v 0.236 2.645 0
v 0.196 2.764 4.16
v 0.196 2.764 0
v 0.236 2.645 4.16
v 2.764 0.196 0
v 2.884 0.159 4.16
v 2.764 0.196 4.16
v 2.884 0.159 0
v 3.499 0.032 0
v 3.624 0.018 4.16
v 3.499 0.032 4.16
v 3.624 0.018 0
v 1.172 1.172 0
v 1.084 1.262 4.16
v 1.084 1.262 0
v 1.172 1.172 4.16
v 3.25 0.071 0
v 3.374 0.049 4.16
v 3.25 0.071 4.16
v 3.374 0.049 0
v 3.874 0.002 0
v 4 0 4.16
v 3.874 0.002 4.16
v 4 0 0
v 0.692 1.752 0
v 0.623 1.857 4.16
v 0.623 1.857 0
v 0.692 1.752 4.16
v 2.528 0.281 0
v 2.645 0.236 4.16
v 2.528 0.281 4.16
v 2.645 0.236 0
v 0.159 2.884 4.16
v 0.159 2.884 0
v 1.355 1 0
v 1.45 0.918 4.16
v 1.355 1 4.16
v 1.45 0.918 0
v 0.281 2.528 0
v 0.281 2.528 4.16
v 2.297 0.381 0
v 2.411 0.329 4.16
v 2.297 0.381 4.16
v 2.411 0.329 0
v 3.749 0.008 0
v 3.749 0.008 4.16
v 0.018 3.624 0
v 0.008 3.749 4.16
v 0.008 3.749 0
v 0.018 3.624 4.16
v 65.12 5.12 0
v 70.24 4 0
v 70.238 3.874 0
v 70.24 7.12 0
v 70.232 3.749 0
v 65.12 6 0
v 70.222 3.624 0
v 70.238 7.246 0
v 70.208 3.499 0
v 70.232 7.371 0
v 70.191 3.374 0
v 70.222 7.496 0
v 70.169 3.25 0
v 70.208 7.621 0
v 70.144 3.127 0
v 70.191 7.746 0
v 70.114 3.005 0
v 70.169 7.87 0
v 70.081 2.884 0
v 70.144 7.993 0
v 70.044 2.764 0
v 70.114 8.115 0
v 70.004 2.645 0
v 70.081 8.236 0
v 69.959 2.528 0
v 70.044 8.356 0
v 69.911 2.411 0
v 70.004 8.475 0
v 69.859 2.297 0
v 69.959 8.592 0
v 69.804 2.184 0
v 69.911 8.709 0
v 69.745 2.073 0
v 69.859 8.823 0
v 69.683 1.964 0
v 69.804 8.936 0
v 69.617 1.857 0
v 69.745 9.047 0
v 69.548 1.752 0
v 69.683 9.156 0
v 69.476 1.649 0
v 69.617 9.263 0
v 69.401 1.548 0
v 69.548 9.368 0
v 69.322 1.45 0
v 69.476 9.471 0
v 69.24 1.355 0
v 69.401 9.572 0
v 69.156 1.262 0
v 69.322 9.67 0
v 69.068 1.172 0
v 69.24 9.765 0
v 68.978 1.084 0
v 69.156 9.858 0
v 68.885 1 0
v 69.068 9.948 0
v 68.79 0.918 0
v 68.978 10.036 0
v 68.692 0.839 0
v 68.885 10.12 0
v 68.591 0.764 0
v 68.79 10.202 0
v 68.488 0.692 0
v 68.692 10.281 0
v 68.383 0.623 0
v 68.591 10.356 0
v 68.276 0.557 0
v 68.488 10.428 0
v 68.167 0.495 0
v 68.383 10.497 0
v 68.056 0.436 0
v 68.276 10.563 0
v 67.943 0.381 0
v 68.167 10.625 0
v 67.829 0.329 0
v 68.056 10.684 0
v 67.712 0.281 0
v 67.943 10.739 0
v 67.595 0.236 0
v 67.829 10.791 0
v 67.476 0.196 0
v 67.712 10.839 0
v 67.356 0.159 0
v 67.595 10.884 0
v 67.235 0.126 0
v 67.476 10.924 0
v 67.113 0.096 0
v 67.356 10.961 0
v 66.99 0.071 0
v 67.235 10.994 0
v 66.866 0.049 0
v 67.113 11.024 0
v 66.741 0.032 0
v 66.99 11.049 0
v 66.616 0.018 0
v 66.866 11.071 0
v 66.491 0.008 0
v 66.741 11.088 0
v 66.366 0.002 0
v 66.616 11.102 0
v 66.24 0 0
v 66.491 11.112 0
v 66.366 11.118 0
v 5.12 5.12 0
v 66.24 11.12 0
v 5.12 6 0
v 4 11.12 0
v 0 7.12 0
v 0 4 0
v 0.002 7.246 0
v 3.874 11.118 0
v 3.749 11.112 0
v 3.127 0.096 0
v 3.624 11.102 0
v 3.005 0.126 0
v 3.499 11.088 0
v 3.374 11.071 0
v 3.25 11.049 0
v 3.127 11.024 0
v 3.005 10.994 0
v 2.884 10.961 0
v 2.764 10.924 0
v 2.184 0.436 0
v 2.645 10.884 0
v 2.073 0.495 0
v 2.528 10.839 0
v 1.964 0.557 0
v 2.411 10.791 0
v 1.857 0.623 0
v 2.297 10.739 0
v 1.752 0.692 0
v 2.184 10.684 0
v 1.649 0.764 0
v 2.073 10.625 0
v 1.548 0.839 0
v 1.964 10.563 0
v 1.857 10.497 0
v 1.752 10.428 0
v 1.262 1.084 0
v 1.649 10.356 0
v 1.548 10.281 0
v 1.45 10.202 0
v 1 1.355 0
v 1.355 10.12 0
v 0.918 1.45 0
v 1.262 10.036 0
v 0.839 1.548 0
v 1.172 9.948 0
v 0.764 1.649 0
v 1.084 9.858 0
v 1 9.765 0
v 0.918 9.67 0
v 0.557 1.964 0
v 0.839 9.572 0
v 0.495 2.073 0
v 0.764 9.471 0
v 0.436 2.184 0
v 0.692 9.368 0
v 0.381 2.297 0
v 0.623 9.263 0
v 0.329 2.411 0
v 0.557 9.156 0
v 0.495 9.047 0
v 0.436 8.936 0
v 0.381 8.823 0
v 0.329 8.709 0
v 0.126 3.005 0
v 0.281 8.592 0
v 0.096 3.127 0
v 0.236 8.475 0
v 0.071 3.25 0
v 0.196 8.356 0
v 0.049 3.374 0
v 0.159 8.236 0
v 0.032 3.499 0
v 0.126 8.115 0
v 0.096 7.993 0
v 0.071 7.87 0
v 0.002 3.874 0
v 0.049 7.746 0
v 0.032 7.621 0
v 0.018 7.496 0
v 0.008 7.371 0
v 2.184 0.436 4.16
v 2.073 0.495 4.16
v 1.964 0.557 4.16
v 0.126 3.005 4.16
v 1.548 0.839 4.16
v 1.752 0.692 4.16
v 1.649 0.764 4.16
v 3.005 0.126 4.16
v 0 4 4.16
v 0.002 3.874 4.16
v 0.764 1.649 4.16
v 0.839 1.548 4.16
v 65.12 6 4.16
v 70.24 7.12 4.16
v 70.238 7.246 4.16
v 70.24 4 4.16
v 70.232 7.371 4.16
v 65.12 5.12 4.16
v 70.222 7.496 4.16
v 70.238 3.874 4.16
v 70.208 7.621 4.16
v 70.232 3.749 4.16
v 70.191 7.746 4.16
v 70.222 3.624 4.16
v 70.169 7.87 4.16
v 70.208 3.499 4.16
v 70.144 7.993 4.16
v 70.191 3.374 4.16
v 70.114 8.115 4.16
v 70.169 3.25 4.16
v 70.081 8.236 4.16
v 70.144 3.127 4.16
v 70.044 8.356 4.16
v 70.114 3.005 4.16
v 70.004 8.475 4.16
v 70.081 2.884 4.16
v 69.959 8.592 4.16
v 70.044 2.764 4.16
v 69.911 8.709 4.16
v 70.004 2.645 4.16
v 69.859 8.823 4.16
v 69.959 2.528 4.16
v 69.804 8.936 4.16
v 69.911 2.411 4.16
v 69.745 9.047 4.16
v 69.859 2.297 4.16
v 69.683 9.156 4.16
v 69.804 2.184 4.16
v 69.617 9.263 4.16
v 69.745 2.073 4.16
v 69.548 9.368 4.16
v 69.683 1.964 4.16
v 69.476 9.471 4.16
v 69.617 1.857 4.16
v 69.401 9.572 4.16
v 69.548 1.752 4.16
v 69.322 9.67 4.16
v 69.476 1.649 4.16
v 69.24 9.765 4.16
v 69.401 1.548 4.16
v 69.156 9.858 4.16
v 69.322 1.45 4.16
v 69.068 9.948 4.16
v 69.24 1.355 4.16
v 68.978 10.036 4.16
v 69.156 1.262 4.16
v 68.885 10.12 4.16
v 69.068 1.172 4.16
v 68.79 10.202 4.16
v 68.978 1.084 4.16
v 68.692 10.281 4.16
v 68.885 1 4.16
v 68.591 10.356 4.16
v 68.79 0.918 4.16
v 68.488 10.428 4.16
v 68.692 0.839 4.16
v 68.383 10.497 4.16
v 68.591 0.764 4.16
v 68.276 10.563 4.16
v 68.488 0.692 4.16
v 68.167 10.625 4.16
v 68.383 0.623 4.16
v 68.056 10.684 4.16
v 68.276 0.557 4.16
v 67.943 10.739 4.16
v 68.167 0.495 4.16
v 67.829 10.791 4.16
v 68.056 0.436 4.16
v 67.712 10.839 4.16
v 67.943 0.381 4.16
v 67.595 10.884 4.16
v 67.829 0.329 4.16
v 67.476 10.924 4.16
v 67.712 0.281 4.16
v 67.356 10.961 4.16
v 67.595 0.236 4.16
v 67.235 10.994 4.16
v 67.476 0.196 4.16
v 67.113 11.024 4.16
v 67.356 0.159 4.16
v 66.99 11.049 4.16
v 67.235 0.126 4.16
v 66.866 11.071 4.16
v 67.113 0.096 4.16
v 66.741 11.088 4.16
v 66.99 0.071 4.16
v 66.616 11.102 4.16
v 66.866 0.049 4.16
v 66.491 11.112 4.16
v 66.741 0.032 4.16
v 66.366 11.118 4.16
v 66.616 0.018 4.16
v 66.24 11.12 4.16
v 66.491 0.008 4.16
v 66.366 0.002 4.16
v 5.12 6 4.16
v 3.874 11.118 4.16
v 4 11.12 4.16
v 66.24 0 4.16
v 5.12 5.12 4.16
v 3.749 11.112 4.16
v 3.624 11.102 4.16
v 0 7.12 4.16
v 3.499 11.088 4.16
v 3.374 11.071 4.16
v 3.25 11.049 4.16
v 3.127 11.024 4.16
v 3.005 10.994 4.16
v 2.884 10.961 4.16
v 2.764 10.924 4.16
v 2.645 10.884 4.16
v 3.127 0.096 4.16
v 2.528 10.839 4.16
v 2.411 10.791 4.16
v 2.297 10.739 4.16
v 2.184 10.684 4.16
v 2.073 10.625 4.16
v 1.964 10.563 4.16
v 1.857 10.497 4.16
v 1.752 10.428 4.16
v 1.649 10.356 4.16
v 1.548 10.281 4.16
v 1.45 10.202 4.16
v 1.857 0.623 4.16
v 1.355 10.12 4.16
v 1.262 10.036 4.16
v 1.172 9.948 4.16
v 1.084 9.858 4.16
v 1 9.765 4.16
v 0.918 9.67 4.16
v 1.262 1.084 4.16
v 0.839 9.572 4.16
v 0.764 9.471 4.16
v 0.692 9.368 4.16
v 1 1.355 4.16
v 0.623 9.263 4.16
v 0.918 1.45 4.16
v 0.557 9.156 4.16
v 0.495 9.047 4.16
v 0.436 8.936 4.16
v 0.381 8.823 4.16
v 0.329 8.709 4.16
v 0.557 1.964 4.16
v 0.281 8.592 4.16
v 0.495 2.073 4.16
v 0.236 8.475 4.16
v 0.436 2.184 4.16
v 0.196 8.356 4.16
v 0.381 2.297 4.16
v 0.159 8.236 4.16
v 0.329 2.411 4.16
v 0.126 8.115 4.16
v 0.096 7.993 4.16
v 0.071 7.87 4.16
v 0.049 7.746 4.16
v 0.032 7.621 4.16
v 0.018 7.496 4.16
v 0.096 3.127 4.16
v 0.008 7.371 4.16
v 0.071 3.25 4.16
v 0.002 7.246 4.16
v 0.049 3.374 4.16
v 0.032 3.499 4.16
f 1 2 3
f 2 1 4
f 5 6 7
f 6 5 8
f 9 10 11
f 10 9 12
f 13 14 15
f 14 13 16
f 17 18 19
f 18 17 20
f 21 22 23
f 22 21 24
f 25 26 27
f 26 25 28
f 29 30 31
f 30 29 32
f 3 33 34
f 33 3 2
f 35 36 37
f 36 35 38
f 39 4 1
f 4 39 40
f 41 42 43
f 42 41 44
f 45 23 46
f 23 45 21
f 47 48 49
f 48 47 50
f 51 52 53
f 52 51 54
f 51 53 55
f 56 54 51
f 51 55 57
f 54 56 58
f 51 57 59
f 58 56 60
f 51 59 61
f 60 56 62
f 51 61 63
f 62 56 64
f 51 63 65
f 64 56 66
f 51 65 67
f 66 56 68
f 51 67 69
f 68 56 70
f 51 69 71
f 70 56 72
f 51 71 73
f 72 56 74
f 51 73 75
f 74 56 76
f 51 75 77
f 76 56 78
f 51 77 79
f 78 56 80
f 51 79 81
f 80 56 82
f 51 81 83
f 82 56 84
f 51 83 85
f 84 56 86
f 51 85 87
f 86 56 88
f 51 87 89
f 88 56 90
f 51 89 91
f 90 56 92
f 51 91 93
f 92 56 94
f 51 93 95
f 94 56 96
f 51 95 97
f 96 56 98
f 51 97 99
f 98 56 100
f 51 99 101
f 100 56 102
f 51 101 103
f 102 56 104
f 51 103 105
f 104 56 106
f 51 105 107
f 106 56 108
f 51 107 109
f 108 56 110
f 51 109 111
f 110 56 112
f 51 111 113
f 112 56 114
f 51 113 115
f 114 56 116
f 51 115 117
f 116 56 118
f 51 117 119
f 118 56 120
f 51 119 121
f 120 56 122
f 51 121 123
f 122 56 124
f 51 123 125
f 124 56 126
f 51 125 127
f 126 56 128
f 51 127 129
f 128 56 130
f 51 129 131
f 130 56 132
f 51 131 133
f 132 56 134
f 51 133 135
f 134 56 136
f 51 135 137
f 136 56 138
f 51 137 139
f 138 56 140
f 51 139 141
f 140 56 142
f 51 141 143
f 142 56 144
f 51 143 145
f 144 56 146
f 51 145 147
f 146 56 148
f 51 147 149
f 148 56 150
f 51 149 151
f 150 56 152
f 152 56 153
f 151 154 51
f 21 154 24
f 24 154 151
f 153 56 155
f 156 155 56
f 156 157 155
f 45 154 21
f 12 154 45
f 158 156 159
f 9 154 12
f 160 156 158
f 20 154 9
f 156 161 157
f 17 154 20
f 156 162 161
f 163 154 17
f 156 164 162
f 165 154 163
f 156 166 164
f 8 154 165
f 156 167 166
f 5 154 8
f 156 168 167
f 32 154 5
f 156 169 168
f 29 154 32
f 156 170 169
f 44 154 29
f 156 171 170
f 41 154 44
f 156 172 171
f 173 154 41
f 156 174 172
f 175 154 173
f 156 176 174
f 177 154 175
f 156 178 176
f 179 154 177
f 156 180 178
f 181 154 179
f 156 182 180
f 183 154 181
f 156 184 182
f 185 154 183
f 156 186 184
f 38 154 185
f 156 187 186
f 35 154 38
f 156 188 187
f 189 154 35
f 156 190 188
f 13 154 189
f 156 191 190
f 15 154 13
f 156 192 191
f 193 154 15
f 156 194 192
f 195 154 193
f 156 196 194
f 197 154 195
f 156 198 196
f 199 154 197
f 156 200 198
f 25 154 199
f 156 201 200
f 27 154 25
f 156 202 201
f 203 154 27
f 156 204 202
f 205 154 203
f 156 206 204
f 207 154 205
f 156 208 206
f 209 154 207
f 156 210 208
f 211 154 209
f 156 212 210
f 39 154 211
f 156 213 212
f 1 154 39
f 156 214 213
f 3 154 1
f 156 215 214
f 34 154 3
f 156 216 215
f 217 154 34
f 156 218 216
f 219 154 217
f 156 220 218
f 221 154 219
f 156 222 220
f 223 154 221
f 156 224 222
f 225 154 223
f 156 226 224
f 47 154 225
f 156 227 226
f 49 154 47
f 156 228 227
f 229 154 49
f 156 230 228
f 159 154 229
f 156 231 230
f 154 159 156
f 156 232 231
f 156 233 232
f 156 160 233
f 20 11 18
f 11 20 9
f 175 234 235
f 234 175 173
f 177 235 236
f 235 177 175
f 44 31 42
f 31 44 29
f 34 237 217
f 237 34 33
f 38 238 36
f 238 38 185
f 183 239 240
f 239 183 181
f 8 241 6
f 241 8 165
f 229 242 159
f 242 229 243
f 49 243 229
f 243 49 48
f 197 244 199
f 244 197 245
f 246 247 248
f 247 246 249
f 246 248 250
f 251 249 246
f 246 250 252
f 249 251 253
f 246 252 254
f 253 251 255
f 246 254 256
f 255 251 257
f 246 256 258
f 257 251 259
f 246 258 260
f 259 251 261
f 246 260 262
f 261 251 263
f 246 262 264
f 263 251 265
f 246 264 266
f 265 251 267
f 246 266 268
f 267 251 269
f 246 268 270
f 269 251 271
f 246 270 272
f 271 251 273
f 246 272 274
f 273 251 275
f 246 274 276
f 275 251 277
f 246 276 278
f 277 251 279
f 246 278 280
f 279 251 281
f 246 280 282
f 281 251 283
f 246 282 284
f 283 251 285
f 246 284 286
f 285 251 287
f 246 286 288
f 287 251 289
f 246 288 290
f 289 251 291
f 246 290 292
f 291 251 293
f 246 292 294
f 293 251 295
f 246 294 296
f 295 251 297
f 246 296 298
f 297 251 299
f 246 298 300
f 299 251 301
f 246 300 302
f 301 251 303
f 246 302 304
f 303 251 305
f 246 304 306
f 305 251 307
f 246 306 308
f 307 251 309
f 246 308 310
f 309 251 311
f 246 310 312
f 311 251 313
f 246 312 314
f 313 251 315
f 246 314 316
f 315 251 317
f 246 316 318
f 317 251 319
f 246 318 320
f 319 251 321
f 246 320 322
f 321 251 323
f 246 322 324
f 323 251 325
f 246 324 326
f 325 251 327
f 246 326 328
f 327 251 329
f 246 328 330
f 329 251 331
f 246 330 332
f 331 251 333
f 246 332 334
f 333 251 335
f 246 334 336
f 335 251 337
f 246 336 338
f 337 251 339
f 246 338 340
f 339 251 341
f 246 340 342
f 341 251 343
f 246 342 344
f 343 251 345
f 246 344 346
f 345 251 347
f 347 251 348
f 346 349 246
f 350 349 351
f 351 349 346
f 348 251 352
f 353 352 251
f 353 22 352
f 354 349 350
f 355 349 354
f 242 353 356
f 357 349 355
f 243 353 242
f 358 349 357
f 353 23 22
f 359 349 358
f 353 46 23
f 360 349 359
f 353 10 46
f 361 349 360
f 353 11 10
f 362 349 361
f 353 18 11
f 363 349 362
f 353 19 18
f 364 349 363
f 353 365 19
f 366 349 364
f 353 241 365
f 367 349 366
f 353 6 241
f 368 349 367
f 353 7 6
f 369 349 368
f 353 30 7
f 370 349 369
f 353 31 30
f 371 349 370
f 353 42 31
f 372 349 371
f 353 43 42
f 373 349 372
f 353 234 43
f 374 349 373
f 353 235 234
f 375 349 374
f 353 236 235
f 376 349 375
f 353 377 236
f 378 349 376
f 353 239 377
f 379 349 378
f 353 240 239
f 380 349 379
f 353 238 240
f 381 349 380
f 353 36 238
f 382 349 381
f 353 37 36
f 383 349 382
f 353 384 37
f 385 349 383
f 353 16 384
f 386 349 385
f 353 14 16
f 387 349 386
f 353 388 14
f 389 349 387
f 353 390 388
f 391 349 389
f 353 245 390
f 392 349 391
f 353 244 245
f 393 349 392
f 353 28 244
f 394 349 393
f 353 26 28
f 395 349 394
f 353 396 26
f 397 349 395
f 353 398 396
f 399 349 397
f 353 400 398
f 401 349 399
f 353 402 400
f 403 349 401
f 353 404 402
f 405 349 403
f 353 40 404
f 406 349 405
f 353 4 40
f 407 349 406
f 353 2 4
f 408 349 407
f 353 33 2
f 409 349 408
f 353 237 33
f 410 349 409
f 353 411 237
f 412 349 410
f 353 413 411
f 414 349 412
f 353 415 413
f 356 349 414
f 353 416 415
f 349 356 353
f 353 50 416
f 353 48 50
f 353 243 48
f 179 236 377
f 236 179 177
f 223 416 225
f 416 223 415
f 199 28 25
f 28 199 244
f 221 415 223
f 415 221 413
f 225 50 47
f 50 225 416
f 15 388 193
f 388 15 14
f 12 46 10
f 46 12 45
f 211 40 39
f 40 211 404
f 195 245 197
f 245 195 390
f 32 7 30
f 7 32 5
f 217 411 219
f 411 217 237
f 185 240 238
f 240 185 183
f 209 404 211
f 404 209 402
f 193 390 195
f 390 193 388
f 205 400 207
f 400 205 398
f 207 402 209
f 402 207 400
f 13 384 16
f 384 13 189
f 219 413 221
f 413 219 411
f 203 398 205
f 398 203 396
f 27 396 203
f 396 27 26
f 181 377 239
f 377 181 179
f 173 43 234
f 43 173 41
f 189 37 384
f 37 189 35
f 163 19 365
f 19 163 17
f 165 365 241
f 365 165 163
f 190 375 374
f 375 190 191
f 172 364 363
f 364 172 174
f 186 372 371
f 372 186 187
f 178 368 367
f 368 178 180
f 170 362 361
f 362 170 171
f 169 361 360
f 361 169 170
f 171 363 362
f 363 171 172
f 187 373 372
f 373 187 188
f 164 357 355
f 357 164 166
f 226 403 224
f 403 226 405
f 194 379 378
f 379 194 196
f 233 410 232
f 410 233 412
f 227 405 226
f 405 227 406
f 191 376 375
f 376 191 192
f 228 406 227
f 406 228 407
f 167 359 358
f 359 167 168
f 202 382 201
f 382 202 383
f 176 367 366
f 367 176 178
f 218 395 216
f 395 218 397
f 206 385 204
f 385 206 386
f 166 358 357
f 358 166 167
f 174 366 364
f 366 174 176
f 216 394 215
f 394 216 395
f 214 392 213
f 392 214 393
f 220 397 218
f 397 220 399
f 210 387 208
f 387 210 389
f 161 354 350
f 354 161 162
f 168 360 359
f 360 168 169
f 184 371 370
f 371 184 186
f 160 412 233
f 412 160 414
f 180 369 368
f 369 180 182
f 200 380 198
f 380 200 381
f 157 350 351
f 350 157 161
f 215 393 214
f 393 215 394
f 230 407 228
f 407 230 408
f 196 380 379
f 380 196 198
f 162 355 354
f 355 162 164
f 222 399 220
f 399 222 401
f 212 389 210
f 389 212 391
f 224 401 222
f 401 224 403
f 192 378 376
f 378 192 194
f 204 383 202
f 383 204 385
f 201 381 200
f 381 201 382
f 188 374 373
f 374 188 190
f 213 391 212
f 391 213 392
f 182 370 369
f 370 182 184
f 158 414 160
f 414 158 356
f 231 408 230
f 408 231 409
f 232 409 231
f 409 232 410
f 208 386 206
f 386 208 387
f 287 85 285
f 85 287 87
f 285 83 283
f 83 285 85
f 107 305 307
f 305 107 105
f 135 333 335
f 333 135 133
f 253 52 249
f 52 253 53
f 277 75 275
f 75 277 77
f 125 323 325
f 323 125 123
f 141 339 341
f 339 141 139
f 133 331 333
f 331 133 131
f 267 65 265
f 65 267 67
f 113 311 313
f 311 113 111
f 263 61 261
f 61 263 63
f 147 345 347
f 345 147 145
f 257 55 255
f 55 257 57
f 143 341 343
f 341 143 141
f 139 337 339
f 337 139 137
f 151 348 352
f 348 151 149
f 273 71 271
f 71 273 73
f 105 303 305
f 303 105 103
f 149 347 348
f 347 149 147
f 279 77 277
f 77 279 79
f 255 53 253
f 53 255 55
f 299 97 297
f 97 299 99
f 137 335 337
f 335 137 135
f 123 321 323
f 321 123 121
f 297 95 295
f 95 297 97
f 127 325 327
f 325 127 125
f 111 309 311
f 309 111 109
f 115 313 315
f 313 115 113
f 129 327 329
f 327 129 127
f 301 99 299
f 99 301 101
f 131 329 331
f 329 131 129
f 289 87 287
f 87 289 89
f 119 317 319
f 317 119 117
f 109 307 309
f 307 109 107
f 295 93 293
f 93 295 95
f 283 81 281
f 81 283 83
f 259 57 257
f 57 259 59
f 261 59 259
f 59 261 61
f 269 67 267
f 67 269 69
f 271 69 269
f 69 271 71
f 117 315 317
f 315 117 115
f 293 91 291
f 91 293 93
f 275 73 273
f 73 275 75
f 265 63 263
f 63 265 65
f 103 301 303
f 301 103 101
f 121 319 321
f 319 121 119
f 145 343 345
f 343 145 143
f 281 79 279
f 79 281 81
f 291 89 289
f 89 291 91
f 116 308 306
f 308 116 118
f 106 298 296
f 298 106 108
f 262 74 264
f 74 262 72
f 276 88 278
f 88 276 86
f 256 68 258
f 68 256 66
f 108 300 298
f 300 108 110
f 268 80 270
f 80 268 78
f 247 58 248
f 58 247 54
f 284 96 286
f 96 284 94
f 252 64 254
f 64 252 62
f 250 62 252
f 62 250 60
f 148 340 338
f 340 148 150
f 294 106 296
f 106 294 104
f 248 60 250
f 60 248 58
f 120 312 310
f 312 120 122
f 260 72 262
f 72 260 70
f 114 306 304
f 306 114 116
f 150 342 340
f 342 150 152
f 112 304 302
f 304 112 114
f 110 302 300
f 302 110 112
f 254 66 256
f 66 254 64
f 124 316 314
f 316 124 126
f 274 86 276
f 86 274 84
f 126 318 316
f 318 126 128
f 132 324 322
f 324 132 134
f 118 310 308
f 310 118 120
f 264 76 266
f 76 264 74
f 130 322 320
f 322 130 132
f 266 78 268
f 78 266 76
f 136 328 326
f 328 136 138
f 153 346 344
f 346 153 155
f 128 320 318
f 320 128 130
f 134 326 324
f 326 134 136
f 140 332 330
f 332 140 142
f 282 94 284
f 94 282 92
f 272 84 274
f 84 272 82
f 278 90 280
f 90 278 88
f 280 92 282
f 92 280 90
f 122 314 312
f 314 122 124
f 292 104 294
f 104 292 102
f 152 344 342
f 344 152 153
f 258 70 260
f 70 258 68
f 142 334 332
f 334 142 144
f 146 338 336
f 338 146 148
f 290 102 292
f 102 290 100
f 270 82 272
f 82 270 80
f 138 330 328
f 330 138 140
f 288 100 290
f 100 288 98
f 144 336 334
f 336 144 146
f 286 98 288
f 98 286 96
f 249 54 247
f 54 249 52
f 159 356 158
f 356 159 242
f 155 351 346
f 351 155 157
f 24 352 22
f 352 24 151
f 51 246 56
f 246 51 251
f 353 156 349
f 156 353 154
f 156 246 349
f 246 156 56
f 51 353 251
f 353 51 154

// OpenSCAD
// file: ../sc.scad
// ShortCuts.scad 
// Autor: Rudolf Huttary, Berlin 2015
//
$fn = 100; 

//show_examples(); 

module show_examples()
	place_in_rect(30, 30)
	{
		Cy(h = 10); 
		CyH(h = 10); 
		CyH(h = 10, w = 30); 
		CyS(h = 10); 
		CyS(h = 10, w1 = 25, w2 = 75); 
		Cu(10); 
		Ri(h = 10); 
		RiH(h = 10); 
		RiS(h = 10, w1 = 10); 
		RiS(h = 10, w1 = 30, w2 = 300); 
		Sp(); 
		SpH(10, 30, 30); 
	}


module help()
{
echo("==============="); 
echo("help(): shows this help"); 
echo("show_examples(): shows some examples"); 
echo("place_in_rect(): places children objects in grid"); 
echo("Transformations:"); 
echo(" transform :  T(x=0, y=0, z=0), Tx(x=0) , Ty(y=0), Tz(z=0)"); 
echo(" rotate :  R(x=0, y=0, z=0), Rx(x=0) , Ry(y=0), Rz(z=0)"); 
echo(" scale :  S(x=1, y=1, z=1), Sx(x=1) , Sy(y=1), Sz(z=1)"); 
echo("Logical"); 
echo(" difference :  D()"); 
echo(" union :  U()"); 
echo(" intersection : *missing*"); 
echo("Primitives"); 
echo(" circle :  Ci(r=10)"); 
echo(" circle_half :  CiH(r=10, w=0)")
echo(" circle_segment :  CiS(r=10, w1=0, w2=90)")
echo(" square :  Sq(x=10, y=0, center=true))"); 
echo(" cylinder :  Cy(r=10, h=1, center=true)"); 
echo(" cylinder_half :  CyH(r=10, w=0)")
echo(" cylinder_segment: CyS(r=10, h=1, w1=0, w2=90,center=true)"); 
echo(" cylinder_segment: Pie(r=10, h=1, w1=0, w2=90,center=true)"); 
echo(" cube :  Cu(x=10, y=0, z=10, center=true)"); 
echo(" ring :  Ri(R=10, r=5, h=1, center=true)"); 
echo(" ring_half :  RiH(R=10, r=5, h=1, w=0 center=true)"); 
echo(" ring_segment :  RiS(R=10, r=5, h=1, w1=0, w2=90, center=true)"); 
echo(" sphere:  Sp(r=10))"); 
echo(" sphere_half:  SpH(r=10, w1 = 0, w2 = 0))"); 
echo("==============="); 
}

// Euclidean Transformations
module T(x=0, y=0, z=0){translate([x, y, z])children(); }
module Tx(x) { translate([x, 0, 0])children(); }
module Ty(y) { translate([0, y, 0])children(); }
module Tz(z) { translate([0, 0, z])children(); }

module R(x=0, y=0, z=0){rotate([x, y, z]) children();}
module Rx(x=90){rotate([x, 0, 0]) children();}
module Ry(y=90){rotate([0, y, 0]) children();}
module Rz(z=90){rotate([0, 0, z]) children();}

module M(x=0, y=0, z=0){mirror([x, y, z]) children();}
module Mx(x=1){mirror([x, 0, 0]) children();}
module My(y=1){mirror([0, y, 0]) children();}
module Mz(z=1){mirror([0, 0, z]) children();}

module S(x=1, y=1, z=1){scale([x, y, z]) children();}
module Sx(x=1){scale([x, 1, 1]) children();}
module Sy(y=1){scale([1, y, 1]) children();}
module Sz(z=1){scale([1, 1, z]) children();}

module D() difference(){children(0); children([1:$children-1]);}
module U() children([0:$children-1]);
// module I() intersection()children([0:$children-1]); // does not work for some reason


// primitives - 2D

module Sq(x =10, y = 0, center = false)
{
   if(y==0)
		square([x, x], center = center); 
	else
		square([x, y], center = center); 
}
module Ci(r = 10)
{
	circle(r = r); 
}

// derived primitives - 2d
module CiH(r = 10, w = 0)
  circle_half(r, w); 

module CiS(r = 10, w1 = 0, w2 = 90)
  circle_segment(r, w1, w2); 


// primitives - 3d
module Cy(r = 10, h = 1, center = false)
{
	cylinder(r = r, h = h, center = center); 
}
module Cu(x = 10, y = 0, z = 10, center = false)
{
  if (y==0)
	cube([x, x, x], center = center); 
  else
	cube([x, y, z], center = center); 
}

// derived primitives - 3d
module CyH(r = 10, h = 1, w = 0, center = false)
  cylinder_half(r, h, w, center); 

module CyS(r = 10, h = 1, w1 = 0, w2 = 90, center = false)
  cylinder_segment(r, h, w1, w2, center); 

module Ri(R = 10, r = 5, h = 1, center = false)
  ring(R, r, h, center); 

module RiS(R = 10, r = 5, h = 1, w1 = 0, w2 = 90, center = false)
   ring_segment(R, r, h, w1, w2, center); 

module RiH(r1 = 10, r2, h = 1, w = 0, center = false)
   ring_half(r1, r2, h, w, center); 
module Pie(r = 10, h = 1, w1 = 0, w2 = 90, center = false)
  cylinder_segment(r, h, w1, w2, center);  
module Sp(r = 10)
  sphere(r); 
module SpH(r = 10, w1 = 0, w2 = 0)
  sphere_half(r, w1, w2); 
module SpS(r = 10, w1 = 0, w2 = 90, w3 = 90)
  sphere_segment(r, w1, w2); 




// clear text definitions
module circle_half(r = 10, w = 0)
{
	difference()
	{
		circle(r); 
     rotate([0, 0, w-90])
     translate([0, -r])
		square([r, 2*r], center = false); 
	}
}

module circle_segment(r = 10, w1 = 0, w2 = 90)
{
  W2 = (w1>w2)?w2+360:w2; 
  if (W2-w1 < 180)
    intersection()
		{
       circle_half(r, w1); 
       circle_half(r, W2-180); 
 		}
	else
    union()
		{
       circle_half(r, w1); 
       circle_half(r, W2-180); 
 		}
}

module cylinder_half(r = 10, h = 1, w = 0, center = true)
{
  linear_extrude(height = h, center = center)
  circle_half(r, w); 
} 

module cylinder_segment(r = 10, h = 1, w1 = 0, w2 = 90, center = true)
{
  linear_extrude(height = h, center = center)
  circle_segment(r, w1, w2); 
} 

module ring(R = 10, r = 5, h = 1, center = true)
{
	difference()
	{
	cylinder(r = R, h = h, center = center); 
   translate([0, 0, -2*h])
	cylinder(r = r, h = 4*h, center = false); 
	}
}

module ring_half(R = 10, r = 5, h = 1, w = 0, center = true)
{
	difference()
	{
		ring(R, r, h, center); 
     rotate([0, 0, w])
     translate([0, -R/2, 0])
		cube([2*R, R, 3*h], center = true); 
	}
}

module ring_segment(R = 10, r = 5, h = 1, w1 = 0, w2 = 90, center = true)
{
  W2 = (w1>w2)?w2+360:w2; 
  if (W2-w1 < 180)
    intersection()
		{
       ring_half(R, r, h, w1, center); 
       ring_half(R, r, h, W2-180, center); 
 		}
	else
    union()
		{
       ring_half(R, r, h, w1, center); 
       ring_half(R, r, h, W2-180, center); 
 		}
}


module sphere_half(r = 10, w1 = 0, w2 = 0)
{  
	difference()
	{
   	sphere(r); 
      rotate([-w1, -w2, 0])
     	translate([0, 0, r])
		cube([2*r, 2*r, r], center = true); 
	}

}


// additional code
module place_in_rect(dx =20, dy=20)
{
  cols = ceil(sqrt($children)); 
  rows = floor(sqrt($children)); 
  for(i = [0:$children-1])
	{ 
	  T(dx*(-cols/2+(i%cols)+.5), dy*(rows/2-floor(i/cols)-.5))
		 children(i); 
	}
}
// main file
$fn=200;

use <../lib.scad>

lineHeight = 0.32;
lineWidth = 0.64;
/*
slot=80;        // Cetafil
ws=1.4;         // width of slot

slot=50;        // Creme barbear
slot=65;        // Bepantol
*/
slot=60;        // Colgate
ws=0.88;        // width of slot

width=5;
height=4;

/*****************************/
w = multiple(width,lineWidth); 
h = multiple(height,lineHeight); 
echo(w);
echo(h);

difference(){
    rcube(slot+w*2,w*2+ws,h,4);
    
    translate([w,w,-.1])    scube(slot,ws,h*2);
}   
